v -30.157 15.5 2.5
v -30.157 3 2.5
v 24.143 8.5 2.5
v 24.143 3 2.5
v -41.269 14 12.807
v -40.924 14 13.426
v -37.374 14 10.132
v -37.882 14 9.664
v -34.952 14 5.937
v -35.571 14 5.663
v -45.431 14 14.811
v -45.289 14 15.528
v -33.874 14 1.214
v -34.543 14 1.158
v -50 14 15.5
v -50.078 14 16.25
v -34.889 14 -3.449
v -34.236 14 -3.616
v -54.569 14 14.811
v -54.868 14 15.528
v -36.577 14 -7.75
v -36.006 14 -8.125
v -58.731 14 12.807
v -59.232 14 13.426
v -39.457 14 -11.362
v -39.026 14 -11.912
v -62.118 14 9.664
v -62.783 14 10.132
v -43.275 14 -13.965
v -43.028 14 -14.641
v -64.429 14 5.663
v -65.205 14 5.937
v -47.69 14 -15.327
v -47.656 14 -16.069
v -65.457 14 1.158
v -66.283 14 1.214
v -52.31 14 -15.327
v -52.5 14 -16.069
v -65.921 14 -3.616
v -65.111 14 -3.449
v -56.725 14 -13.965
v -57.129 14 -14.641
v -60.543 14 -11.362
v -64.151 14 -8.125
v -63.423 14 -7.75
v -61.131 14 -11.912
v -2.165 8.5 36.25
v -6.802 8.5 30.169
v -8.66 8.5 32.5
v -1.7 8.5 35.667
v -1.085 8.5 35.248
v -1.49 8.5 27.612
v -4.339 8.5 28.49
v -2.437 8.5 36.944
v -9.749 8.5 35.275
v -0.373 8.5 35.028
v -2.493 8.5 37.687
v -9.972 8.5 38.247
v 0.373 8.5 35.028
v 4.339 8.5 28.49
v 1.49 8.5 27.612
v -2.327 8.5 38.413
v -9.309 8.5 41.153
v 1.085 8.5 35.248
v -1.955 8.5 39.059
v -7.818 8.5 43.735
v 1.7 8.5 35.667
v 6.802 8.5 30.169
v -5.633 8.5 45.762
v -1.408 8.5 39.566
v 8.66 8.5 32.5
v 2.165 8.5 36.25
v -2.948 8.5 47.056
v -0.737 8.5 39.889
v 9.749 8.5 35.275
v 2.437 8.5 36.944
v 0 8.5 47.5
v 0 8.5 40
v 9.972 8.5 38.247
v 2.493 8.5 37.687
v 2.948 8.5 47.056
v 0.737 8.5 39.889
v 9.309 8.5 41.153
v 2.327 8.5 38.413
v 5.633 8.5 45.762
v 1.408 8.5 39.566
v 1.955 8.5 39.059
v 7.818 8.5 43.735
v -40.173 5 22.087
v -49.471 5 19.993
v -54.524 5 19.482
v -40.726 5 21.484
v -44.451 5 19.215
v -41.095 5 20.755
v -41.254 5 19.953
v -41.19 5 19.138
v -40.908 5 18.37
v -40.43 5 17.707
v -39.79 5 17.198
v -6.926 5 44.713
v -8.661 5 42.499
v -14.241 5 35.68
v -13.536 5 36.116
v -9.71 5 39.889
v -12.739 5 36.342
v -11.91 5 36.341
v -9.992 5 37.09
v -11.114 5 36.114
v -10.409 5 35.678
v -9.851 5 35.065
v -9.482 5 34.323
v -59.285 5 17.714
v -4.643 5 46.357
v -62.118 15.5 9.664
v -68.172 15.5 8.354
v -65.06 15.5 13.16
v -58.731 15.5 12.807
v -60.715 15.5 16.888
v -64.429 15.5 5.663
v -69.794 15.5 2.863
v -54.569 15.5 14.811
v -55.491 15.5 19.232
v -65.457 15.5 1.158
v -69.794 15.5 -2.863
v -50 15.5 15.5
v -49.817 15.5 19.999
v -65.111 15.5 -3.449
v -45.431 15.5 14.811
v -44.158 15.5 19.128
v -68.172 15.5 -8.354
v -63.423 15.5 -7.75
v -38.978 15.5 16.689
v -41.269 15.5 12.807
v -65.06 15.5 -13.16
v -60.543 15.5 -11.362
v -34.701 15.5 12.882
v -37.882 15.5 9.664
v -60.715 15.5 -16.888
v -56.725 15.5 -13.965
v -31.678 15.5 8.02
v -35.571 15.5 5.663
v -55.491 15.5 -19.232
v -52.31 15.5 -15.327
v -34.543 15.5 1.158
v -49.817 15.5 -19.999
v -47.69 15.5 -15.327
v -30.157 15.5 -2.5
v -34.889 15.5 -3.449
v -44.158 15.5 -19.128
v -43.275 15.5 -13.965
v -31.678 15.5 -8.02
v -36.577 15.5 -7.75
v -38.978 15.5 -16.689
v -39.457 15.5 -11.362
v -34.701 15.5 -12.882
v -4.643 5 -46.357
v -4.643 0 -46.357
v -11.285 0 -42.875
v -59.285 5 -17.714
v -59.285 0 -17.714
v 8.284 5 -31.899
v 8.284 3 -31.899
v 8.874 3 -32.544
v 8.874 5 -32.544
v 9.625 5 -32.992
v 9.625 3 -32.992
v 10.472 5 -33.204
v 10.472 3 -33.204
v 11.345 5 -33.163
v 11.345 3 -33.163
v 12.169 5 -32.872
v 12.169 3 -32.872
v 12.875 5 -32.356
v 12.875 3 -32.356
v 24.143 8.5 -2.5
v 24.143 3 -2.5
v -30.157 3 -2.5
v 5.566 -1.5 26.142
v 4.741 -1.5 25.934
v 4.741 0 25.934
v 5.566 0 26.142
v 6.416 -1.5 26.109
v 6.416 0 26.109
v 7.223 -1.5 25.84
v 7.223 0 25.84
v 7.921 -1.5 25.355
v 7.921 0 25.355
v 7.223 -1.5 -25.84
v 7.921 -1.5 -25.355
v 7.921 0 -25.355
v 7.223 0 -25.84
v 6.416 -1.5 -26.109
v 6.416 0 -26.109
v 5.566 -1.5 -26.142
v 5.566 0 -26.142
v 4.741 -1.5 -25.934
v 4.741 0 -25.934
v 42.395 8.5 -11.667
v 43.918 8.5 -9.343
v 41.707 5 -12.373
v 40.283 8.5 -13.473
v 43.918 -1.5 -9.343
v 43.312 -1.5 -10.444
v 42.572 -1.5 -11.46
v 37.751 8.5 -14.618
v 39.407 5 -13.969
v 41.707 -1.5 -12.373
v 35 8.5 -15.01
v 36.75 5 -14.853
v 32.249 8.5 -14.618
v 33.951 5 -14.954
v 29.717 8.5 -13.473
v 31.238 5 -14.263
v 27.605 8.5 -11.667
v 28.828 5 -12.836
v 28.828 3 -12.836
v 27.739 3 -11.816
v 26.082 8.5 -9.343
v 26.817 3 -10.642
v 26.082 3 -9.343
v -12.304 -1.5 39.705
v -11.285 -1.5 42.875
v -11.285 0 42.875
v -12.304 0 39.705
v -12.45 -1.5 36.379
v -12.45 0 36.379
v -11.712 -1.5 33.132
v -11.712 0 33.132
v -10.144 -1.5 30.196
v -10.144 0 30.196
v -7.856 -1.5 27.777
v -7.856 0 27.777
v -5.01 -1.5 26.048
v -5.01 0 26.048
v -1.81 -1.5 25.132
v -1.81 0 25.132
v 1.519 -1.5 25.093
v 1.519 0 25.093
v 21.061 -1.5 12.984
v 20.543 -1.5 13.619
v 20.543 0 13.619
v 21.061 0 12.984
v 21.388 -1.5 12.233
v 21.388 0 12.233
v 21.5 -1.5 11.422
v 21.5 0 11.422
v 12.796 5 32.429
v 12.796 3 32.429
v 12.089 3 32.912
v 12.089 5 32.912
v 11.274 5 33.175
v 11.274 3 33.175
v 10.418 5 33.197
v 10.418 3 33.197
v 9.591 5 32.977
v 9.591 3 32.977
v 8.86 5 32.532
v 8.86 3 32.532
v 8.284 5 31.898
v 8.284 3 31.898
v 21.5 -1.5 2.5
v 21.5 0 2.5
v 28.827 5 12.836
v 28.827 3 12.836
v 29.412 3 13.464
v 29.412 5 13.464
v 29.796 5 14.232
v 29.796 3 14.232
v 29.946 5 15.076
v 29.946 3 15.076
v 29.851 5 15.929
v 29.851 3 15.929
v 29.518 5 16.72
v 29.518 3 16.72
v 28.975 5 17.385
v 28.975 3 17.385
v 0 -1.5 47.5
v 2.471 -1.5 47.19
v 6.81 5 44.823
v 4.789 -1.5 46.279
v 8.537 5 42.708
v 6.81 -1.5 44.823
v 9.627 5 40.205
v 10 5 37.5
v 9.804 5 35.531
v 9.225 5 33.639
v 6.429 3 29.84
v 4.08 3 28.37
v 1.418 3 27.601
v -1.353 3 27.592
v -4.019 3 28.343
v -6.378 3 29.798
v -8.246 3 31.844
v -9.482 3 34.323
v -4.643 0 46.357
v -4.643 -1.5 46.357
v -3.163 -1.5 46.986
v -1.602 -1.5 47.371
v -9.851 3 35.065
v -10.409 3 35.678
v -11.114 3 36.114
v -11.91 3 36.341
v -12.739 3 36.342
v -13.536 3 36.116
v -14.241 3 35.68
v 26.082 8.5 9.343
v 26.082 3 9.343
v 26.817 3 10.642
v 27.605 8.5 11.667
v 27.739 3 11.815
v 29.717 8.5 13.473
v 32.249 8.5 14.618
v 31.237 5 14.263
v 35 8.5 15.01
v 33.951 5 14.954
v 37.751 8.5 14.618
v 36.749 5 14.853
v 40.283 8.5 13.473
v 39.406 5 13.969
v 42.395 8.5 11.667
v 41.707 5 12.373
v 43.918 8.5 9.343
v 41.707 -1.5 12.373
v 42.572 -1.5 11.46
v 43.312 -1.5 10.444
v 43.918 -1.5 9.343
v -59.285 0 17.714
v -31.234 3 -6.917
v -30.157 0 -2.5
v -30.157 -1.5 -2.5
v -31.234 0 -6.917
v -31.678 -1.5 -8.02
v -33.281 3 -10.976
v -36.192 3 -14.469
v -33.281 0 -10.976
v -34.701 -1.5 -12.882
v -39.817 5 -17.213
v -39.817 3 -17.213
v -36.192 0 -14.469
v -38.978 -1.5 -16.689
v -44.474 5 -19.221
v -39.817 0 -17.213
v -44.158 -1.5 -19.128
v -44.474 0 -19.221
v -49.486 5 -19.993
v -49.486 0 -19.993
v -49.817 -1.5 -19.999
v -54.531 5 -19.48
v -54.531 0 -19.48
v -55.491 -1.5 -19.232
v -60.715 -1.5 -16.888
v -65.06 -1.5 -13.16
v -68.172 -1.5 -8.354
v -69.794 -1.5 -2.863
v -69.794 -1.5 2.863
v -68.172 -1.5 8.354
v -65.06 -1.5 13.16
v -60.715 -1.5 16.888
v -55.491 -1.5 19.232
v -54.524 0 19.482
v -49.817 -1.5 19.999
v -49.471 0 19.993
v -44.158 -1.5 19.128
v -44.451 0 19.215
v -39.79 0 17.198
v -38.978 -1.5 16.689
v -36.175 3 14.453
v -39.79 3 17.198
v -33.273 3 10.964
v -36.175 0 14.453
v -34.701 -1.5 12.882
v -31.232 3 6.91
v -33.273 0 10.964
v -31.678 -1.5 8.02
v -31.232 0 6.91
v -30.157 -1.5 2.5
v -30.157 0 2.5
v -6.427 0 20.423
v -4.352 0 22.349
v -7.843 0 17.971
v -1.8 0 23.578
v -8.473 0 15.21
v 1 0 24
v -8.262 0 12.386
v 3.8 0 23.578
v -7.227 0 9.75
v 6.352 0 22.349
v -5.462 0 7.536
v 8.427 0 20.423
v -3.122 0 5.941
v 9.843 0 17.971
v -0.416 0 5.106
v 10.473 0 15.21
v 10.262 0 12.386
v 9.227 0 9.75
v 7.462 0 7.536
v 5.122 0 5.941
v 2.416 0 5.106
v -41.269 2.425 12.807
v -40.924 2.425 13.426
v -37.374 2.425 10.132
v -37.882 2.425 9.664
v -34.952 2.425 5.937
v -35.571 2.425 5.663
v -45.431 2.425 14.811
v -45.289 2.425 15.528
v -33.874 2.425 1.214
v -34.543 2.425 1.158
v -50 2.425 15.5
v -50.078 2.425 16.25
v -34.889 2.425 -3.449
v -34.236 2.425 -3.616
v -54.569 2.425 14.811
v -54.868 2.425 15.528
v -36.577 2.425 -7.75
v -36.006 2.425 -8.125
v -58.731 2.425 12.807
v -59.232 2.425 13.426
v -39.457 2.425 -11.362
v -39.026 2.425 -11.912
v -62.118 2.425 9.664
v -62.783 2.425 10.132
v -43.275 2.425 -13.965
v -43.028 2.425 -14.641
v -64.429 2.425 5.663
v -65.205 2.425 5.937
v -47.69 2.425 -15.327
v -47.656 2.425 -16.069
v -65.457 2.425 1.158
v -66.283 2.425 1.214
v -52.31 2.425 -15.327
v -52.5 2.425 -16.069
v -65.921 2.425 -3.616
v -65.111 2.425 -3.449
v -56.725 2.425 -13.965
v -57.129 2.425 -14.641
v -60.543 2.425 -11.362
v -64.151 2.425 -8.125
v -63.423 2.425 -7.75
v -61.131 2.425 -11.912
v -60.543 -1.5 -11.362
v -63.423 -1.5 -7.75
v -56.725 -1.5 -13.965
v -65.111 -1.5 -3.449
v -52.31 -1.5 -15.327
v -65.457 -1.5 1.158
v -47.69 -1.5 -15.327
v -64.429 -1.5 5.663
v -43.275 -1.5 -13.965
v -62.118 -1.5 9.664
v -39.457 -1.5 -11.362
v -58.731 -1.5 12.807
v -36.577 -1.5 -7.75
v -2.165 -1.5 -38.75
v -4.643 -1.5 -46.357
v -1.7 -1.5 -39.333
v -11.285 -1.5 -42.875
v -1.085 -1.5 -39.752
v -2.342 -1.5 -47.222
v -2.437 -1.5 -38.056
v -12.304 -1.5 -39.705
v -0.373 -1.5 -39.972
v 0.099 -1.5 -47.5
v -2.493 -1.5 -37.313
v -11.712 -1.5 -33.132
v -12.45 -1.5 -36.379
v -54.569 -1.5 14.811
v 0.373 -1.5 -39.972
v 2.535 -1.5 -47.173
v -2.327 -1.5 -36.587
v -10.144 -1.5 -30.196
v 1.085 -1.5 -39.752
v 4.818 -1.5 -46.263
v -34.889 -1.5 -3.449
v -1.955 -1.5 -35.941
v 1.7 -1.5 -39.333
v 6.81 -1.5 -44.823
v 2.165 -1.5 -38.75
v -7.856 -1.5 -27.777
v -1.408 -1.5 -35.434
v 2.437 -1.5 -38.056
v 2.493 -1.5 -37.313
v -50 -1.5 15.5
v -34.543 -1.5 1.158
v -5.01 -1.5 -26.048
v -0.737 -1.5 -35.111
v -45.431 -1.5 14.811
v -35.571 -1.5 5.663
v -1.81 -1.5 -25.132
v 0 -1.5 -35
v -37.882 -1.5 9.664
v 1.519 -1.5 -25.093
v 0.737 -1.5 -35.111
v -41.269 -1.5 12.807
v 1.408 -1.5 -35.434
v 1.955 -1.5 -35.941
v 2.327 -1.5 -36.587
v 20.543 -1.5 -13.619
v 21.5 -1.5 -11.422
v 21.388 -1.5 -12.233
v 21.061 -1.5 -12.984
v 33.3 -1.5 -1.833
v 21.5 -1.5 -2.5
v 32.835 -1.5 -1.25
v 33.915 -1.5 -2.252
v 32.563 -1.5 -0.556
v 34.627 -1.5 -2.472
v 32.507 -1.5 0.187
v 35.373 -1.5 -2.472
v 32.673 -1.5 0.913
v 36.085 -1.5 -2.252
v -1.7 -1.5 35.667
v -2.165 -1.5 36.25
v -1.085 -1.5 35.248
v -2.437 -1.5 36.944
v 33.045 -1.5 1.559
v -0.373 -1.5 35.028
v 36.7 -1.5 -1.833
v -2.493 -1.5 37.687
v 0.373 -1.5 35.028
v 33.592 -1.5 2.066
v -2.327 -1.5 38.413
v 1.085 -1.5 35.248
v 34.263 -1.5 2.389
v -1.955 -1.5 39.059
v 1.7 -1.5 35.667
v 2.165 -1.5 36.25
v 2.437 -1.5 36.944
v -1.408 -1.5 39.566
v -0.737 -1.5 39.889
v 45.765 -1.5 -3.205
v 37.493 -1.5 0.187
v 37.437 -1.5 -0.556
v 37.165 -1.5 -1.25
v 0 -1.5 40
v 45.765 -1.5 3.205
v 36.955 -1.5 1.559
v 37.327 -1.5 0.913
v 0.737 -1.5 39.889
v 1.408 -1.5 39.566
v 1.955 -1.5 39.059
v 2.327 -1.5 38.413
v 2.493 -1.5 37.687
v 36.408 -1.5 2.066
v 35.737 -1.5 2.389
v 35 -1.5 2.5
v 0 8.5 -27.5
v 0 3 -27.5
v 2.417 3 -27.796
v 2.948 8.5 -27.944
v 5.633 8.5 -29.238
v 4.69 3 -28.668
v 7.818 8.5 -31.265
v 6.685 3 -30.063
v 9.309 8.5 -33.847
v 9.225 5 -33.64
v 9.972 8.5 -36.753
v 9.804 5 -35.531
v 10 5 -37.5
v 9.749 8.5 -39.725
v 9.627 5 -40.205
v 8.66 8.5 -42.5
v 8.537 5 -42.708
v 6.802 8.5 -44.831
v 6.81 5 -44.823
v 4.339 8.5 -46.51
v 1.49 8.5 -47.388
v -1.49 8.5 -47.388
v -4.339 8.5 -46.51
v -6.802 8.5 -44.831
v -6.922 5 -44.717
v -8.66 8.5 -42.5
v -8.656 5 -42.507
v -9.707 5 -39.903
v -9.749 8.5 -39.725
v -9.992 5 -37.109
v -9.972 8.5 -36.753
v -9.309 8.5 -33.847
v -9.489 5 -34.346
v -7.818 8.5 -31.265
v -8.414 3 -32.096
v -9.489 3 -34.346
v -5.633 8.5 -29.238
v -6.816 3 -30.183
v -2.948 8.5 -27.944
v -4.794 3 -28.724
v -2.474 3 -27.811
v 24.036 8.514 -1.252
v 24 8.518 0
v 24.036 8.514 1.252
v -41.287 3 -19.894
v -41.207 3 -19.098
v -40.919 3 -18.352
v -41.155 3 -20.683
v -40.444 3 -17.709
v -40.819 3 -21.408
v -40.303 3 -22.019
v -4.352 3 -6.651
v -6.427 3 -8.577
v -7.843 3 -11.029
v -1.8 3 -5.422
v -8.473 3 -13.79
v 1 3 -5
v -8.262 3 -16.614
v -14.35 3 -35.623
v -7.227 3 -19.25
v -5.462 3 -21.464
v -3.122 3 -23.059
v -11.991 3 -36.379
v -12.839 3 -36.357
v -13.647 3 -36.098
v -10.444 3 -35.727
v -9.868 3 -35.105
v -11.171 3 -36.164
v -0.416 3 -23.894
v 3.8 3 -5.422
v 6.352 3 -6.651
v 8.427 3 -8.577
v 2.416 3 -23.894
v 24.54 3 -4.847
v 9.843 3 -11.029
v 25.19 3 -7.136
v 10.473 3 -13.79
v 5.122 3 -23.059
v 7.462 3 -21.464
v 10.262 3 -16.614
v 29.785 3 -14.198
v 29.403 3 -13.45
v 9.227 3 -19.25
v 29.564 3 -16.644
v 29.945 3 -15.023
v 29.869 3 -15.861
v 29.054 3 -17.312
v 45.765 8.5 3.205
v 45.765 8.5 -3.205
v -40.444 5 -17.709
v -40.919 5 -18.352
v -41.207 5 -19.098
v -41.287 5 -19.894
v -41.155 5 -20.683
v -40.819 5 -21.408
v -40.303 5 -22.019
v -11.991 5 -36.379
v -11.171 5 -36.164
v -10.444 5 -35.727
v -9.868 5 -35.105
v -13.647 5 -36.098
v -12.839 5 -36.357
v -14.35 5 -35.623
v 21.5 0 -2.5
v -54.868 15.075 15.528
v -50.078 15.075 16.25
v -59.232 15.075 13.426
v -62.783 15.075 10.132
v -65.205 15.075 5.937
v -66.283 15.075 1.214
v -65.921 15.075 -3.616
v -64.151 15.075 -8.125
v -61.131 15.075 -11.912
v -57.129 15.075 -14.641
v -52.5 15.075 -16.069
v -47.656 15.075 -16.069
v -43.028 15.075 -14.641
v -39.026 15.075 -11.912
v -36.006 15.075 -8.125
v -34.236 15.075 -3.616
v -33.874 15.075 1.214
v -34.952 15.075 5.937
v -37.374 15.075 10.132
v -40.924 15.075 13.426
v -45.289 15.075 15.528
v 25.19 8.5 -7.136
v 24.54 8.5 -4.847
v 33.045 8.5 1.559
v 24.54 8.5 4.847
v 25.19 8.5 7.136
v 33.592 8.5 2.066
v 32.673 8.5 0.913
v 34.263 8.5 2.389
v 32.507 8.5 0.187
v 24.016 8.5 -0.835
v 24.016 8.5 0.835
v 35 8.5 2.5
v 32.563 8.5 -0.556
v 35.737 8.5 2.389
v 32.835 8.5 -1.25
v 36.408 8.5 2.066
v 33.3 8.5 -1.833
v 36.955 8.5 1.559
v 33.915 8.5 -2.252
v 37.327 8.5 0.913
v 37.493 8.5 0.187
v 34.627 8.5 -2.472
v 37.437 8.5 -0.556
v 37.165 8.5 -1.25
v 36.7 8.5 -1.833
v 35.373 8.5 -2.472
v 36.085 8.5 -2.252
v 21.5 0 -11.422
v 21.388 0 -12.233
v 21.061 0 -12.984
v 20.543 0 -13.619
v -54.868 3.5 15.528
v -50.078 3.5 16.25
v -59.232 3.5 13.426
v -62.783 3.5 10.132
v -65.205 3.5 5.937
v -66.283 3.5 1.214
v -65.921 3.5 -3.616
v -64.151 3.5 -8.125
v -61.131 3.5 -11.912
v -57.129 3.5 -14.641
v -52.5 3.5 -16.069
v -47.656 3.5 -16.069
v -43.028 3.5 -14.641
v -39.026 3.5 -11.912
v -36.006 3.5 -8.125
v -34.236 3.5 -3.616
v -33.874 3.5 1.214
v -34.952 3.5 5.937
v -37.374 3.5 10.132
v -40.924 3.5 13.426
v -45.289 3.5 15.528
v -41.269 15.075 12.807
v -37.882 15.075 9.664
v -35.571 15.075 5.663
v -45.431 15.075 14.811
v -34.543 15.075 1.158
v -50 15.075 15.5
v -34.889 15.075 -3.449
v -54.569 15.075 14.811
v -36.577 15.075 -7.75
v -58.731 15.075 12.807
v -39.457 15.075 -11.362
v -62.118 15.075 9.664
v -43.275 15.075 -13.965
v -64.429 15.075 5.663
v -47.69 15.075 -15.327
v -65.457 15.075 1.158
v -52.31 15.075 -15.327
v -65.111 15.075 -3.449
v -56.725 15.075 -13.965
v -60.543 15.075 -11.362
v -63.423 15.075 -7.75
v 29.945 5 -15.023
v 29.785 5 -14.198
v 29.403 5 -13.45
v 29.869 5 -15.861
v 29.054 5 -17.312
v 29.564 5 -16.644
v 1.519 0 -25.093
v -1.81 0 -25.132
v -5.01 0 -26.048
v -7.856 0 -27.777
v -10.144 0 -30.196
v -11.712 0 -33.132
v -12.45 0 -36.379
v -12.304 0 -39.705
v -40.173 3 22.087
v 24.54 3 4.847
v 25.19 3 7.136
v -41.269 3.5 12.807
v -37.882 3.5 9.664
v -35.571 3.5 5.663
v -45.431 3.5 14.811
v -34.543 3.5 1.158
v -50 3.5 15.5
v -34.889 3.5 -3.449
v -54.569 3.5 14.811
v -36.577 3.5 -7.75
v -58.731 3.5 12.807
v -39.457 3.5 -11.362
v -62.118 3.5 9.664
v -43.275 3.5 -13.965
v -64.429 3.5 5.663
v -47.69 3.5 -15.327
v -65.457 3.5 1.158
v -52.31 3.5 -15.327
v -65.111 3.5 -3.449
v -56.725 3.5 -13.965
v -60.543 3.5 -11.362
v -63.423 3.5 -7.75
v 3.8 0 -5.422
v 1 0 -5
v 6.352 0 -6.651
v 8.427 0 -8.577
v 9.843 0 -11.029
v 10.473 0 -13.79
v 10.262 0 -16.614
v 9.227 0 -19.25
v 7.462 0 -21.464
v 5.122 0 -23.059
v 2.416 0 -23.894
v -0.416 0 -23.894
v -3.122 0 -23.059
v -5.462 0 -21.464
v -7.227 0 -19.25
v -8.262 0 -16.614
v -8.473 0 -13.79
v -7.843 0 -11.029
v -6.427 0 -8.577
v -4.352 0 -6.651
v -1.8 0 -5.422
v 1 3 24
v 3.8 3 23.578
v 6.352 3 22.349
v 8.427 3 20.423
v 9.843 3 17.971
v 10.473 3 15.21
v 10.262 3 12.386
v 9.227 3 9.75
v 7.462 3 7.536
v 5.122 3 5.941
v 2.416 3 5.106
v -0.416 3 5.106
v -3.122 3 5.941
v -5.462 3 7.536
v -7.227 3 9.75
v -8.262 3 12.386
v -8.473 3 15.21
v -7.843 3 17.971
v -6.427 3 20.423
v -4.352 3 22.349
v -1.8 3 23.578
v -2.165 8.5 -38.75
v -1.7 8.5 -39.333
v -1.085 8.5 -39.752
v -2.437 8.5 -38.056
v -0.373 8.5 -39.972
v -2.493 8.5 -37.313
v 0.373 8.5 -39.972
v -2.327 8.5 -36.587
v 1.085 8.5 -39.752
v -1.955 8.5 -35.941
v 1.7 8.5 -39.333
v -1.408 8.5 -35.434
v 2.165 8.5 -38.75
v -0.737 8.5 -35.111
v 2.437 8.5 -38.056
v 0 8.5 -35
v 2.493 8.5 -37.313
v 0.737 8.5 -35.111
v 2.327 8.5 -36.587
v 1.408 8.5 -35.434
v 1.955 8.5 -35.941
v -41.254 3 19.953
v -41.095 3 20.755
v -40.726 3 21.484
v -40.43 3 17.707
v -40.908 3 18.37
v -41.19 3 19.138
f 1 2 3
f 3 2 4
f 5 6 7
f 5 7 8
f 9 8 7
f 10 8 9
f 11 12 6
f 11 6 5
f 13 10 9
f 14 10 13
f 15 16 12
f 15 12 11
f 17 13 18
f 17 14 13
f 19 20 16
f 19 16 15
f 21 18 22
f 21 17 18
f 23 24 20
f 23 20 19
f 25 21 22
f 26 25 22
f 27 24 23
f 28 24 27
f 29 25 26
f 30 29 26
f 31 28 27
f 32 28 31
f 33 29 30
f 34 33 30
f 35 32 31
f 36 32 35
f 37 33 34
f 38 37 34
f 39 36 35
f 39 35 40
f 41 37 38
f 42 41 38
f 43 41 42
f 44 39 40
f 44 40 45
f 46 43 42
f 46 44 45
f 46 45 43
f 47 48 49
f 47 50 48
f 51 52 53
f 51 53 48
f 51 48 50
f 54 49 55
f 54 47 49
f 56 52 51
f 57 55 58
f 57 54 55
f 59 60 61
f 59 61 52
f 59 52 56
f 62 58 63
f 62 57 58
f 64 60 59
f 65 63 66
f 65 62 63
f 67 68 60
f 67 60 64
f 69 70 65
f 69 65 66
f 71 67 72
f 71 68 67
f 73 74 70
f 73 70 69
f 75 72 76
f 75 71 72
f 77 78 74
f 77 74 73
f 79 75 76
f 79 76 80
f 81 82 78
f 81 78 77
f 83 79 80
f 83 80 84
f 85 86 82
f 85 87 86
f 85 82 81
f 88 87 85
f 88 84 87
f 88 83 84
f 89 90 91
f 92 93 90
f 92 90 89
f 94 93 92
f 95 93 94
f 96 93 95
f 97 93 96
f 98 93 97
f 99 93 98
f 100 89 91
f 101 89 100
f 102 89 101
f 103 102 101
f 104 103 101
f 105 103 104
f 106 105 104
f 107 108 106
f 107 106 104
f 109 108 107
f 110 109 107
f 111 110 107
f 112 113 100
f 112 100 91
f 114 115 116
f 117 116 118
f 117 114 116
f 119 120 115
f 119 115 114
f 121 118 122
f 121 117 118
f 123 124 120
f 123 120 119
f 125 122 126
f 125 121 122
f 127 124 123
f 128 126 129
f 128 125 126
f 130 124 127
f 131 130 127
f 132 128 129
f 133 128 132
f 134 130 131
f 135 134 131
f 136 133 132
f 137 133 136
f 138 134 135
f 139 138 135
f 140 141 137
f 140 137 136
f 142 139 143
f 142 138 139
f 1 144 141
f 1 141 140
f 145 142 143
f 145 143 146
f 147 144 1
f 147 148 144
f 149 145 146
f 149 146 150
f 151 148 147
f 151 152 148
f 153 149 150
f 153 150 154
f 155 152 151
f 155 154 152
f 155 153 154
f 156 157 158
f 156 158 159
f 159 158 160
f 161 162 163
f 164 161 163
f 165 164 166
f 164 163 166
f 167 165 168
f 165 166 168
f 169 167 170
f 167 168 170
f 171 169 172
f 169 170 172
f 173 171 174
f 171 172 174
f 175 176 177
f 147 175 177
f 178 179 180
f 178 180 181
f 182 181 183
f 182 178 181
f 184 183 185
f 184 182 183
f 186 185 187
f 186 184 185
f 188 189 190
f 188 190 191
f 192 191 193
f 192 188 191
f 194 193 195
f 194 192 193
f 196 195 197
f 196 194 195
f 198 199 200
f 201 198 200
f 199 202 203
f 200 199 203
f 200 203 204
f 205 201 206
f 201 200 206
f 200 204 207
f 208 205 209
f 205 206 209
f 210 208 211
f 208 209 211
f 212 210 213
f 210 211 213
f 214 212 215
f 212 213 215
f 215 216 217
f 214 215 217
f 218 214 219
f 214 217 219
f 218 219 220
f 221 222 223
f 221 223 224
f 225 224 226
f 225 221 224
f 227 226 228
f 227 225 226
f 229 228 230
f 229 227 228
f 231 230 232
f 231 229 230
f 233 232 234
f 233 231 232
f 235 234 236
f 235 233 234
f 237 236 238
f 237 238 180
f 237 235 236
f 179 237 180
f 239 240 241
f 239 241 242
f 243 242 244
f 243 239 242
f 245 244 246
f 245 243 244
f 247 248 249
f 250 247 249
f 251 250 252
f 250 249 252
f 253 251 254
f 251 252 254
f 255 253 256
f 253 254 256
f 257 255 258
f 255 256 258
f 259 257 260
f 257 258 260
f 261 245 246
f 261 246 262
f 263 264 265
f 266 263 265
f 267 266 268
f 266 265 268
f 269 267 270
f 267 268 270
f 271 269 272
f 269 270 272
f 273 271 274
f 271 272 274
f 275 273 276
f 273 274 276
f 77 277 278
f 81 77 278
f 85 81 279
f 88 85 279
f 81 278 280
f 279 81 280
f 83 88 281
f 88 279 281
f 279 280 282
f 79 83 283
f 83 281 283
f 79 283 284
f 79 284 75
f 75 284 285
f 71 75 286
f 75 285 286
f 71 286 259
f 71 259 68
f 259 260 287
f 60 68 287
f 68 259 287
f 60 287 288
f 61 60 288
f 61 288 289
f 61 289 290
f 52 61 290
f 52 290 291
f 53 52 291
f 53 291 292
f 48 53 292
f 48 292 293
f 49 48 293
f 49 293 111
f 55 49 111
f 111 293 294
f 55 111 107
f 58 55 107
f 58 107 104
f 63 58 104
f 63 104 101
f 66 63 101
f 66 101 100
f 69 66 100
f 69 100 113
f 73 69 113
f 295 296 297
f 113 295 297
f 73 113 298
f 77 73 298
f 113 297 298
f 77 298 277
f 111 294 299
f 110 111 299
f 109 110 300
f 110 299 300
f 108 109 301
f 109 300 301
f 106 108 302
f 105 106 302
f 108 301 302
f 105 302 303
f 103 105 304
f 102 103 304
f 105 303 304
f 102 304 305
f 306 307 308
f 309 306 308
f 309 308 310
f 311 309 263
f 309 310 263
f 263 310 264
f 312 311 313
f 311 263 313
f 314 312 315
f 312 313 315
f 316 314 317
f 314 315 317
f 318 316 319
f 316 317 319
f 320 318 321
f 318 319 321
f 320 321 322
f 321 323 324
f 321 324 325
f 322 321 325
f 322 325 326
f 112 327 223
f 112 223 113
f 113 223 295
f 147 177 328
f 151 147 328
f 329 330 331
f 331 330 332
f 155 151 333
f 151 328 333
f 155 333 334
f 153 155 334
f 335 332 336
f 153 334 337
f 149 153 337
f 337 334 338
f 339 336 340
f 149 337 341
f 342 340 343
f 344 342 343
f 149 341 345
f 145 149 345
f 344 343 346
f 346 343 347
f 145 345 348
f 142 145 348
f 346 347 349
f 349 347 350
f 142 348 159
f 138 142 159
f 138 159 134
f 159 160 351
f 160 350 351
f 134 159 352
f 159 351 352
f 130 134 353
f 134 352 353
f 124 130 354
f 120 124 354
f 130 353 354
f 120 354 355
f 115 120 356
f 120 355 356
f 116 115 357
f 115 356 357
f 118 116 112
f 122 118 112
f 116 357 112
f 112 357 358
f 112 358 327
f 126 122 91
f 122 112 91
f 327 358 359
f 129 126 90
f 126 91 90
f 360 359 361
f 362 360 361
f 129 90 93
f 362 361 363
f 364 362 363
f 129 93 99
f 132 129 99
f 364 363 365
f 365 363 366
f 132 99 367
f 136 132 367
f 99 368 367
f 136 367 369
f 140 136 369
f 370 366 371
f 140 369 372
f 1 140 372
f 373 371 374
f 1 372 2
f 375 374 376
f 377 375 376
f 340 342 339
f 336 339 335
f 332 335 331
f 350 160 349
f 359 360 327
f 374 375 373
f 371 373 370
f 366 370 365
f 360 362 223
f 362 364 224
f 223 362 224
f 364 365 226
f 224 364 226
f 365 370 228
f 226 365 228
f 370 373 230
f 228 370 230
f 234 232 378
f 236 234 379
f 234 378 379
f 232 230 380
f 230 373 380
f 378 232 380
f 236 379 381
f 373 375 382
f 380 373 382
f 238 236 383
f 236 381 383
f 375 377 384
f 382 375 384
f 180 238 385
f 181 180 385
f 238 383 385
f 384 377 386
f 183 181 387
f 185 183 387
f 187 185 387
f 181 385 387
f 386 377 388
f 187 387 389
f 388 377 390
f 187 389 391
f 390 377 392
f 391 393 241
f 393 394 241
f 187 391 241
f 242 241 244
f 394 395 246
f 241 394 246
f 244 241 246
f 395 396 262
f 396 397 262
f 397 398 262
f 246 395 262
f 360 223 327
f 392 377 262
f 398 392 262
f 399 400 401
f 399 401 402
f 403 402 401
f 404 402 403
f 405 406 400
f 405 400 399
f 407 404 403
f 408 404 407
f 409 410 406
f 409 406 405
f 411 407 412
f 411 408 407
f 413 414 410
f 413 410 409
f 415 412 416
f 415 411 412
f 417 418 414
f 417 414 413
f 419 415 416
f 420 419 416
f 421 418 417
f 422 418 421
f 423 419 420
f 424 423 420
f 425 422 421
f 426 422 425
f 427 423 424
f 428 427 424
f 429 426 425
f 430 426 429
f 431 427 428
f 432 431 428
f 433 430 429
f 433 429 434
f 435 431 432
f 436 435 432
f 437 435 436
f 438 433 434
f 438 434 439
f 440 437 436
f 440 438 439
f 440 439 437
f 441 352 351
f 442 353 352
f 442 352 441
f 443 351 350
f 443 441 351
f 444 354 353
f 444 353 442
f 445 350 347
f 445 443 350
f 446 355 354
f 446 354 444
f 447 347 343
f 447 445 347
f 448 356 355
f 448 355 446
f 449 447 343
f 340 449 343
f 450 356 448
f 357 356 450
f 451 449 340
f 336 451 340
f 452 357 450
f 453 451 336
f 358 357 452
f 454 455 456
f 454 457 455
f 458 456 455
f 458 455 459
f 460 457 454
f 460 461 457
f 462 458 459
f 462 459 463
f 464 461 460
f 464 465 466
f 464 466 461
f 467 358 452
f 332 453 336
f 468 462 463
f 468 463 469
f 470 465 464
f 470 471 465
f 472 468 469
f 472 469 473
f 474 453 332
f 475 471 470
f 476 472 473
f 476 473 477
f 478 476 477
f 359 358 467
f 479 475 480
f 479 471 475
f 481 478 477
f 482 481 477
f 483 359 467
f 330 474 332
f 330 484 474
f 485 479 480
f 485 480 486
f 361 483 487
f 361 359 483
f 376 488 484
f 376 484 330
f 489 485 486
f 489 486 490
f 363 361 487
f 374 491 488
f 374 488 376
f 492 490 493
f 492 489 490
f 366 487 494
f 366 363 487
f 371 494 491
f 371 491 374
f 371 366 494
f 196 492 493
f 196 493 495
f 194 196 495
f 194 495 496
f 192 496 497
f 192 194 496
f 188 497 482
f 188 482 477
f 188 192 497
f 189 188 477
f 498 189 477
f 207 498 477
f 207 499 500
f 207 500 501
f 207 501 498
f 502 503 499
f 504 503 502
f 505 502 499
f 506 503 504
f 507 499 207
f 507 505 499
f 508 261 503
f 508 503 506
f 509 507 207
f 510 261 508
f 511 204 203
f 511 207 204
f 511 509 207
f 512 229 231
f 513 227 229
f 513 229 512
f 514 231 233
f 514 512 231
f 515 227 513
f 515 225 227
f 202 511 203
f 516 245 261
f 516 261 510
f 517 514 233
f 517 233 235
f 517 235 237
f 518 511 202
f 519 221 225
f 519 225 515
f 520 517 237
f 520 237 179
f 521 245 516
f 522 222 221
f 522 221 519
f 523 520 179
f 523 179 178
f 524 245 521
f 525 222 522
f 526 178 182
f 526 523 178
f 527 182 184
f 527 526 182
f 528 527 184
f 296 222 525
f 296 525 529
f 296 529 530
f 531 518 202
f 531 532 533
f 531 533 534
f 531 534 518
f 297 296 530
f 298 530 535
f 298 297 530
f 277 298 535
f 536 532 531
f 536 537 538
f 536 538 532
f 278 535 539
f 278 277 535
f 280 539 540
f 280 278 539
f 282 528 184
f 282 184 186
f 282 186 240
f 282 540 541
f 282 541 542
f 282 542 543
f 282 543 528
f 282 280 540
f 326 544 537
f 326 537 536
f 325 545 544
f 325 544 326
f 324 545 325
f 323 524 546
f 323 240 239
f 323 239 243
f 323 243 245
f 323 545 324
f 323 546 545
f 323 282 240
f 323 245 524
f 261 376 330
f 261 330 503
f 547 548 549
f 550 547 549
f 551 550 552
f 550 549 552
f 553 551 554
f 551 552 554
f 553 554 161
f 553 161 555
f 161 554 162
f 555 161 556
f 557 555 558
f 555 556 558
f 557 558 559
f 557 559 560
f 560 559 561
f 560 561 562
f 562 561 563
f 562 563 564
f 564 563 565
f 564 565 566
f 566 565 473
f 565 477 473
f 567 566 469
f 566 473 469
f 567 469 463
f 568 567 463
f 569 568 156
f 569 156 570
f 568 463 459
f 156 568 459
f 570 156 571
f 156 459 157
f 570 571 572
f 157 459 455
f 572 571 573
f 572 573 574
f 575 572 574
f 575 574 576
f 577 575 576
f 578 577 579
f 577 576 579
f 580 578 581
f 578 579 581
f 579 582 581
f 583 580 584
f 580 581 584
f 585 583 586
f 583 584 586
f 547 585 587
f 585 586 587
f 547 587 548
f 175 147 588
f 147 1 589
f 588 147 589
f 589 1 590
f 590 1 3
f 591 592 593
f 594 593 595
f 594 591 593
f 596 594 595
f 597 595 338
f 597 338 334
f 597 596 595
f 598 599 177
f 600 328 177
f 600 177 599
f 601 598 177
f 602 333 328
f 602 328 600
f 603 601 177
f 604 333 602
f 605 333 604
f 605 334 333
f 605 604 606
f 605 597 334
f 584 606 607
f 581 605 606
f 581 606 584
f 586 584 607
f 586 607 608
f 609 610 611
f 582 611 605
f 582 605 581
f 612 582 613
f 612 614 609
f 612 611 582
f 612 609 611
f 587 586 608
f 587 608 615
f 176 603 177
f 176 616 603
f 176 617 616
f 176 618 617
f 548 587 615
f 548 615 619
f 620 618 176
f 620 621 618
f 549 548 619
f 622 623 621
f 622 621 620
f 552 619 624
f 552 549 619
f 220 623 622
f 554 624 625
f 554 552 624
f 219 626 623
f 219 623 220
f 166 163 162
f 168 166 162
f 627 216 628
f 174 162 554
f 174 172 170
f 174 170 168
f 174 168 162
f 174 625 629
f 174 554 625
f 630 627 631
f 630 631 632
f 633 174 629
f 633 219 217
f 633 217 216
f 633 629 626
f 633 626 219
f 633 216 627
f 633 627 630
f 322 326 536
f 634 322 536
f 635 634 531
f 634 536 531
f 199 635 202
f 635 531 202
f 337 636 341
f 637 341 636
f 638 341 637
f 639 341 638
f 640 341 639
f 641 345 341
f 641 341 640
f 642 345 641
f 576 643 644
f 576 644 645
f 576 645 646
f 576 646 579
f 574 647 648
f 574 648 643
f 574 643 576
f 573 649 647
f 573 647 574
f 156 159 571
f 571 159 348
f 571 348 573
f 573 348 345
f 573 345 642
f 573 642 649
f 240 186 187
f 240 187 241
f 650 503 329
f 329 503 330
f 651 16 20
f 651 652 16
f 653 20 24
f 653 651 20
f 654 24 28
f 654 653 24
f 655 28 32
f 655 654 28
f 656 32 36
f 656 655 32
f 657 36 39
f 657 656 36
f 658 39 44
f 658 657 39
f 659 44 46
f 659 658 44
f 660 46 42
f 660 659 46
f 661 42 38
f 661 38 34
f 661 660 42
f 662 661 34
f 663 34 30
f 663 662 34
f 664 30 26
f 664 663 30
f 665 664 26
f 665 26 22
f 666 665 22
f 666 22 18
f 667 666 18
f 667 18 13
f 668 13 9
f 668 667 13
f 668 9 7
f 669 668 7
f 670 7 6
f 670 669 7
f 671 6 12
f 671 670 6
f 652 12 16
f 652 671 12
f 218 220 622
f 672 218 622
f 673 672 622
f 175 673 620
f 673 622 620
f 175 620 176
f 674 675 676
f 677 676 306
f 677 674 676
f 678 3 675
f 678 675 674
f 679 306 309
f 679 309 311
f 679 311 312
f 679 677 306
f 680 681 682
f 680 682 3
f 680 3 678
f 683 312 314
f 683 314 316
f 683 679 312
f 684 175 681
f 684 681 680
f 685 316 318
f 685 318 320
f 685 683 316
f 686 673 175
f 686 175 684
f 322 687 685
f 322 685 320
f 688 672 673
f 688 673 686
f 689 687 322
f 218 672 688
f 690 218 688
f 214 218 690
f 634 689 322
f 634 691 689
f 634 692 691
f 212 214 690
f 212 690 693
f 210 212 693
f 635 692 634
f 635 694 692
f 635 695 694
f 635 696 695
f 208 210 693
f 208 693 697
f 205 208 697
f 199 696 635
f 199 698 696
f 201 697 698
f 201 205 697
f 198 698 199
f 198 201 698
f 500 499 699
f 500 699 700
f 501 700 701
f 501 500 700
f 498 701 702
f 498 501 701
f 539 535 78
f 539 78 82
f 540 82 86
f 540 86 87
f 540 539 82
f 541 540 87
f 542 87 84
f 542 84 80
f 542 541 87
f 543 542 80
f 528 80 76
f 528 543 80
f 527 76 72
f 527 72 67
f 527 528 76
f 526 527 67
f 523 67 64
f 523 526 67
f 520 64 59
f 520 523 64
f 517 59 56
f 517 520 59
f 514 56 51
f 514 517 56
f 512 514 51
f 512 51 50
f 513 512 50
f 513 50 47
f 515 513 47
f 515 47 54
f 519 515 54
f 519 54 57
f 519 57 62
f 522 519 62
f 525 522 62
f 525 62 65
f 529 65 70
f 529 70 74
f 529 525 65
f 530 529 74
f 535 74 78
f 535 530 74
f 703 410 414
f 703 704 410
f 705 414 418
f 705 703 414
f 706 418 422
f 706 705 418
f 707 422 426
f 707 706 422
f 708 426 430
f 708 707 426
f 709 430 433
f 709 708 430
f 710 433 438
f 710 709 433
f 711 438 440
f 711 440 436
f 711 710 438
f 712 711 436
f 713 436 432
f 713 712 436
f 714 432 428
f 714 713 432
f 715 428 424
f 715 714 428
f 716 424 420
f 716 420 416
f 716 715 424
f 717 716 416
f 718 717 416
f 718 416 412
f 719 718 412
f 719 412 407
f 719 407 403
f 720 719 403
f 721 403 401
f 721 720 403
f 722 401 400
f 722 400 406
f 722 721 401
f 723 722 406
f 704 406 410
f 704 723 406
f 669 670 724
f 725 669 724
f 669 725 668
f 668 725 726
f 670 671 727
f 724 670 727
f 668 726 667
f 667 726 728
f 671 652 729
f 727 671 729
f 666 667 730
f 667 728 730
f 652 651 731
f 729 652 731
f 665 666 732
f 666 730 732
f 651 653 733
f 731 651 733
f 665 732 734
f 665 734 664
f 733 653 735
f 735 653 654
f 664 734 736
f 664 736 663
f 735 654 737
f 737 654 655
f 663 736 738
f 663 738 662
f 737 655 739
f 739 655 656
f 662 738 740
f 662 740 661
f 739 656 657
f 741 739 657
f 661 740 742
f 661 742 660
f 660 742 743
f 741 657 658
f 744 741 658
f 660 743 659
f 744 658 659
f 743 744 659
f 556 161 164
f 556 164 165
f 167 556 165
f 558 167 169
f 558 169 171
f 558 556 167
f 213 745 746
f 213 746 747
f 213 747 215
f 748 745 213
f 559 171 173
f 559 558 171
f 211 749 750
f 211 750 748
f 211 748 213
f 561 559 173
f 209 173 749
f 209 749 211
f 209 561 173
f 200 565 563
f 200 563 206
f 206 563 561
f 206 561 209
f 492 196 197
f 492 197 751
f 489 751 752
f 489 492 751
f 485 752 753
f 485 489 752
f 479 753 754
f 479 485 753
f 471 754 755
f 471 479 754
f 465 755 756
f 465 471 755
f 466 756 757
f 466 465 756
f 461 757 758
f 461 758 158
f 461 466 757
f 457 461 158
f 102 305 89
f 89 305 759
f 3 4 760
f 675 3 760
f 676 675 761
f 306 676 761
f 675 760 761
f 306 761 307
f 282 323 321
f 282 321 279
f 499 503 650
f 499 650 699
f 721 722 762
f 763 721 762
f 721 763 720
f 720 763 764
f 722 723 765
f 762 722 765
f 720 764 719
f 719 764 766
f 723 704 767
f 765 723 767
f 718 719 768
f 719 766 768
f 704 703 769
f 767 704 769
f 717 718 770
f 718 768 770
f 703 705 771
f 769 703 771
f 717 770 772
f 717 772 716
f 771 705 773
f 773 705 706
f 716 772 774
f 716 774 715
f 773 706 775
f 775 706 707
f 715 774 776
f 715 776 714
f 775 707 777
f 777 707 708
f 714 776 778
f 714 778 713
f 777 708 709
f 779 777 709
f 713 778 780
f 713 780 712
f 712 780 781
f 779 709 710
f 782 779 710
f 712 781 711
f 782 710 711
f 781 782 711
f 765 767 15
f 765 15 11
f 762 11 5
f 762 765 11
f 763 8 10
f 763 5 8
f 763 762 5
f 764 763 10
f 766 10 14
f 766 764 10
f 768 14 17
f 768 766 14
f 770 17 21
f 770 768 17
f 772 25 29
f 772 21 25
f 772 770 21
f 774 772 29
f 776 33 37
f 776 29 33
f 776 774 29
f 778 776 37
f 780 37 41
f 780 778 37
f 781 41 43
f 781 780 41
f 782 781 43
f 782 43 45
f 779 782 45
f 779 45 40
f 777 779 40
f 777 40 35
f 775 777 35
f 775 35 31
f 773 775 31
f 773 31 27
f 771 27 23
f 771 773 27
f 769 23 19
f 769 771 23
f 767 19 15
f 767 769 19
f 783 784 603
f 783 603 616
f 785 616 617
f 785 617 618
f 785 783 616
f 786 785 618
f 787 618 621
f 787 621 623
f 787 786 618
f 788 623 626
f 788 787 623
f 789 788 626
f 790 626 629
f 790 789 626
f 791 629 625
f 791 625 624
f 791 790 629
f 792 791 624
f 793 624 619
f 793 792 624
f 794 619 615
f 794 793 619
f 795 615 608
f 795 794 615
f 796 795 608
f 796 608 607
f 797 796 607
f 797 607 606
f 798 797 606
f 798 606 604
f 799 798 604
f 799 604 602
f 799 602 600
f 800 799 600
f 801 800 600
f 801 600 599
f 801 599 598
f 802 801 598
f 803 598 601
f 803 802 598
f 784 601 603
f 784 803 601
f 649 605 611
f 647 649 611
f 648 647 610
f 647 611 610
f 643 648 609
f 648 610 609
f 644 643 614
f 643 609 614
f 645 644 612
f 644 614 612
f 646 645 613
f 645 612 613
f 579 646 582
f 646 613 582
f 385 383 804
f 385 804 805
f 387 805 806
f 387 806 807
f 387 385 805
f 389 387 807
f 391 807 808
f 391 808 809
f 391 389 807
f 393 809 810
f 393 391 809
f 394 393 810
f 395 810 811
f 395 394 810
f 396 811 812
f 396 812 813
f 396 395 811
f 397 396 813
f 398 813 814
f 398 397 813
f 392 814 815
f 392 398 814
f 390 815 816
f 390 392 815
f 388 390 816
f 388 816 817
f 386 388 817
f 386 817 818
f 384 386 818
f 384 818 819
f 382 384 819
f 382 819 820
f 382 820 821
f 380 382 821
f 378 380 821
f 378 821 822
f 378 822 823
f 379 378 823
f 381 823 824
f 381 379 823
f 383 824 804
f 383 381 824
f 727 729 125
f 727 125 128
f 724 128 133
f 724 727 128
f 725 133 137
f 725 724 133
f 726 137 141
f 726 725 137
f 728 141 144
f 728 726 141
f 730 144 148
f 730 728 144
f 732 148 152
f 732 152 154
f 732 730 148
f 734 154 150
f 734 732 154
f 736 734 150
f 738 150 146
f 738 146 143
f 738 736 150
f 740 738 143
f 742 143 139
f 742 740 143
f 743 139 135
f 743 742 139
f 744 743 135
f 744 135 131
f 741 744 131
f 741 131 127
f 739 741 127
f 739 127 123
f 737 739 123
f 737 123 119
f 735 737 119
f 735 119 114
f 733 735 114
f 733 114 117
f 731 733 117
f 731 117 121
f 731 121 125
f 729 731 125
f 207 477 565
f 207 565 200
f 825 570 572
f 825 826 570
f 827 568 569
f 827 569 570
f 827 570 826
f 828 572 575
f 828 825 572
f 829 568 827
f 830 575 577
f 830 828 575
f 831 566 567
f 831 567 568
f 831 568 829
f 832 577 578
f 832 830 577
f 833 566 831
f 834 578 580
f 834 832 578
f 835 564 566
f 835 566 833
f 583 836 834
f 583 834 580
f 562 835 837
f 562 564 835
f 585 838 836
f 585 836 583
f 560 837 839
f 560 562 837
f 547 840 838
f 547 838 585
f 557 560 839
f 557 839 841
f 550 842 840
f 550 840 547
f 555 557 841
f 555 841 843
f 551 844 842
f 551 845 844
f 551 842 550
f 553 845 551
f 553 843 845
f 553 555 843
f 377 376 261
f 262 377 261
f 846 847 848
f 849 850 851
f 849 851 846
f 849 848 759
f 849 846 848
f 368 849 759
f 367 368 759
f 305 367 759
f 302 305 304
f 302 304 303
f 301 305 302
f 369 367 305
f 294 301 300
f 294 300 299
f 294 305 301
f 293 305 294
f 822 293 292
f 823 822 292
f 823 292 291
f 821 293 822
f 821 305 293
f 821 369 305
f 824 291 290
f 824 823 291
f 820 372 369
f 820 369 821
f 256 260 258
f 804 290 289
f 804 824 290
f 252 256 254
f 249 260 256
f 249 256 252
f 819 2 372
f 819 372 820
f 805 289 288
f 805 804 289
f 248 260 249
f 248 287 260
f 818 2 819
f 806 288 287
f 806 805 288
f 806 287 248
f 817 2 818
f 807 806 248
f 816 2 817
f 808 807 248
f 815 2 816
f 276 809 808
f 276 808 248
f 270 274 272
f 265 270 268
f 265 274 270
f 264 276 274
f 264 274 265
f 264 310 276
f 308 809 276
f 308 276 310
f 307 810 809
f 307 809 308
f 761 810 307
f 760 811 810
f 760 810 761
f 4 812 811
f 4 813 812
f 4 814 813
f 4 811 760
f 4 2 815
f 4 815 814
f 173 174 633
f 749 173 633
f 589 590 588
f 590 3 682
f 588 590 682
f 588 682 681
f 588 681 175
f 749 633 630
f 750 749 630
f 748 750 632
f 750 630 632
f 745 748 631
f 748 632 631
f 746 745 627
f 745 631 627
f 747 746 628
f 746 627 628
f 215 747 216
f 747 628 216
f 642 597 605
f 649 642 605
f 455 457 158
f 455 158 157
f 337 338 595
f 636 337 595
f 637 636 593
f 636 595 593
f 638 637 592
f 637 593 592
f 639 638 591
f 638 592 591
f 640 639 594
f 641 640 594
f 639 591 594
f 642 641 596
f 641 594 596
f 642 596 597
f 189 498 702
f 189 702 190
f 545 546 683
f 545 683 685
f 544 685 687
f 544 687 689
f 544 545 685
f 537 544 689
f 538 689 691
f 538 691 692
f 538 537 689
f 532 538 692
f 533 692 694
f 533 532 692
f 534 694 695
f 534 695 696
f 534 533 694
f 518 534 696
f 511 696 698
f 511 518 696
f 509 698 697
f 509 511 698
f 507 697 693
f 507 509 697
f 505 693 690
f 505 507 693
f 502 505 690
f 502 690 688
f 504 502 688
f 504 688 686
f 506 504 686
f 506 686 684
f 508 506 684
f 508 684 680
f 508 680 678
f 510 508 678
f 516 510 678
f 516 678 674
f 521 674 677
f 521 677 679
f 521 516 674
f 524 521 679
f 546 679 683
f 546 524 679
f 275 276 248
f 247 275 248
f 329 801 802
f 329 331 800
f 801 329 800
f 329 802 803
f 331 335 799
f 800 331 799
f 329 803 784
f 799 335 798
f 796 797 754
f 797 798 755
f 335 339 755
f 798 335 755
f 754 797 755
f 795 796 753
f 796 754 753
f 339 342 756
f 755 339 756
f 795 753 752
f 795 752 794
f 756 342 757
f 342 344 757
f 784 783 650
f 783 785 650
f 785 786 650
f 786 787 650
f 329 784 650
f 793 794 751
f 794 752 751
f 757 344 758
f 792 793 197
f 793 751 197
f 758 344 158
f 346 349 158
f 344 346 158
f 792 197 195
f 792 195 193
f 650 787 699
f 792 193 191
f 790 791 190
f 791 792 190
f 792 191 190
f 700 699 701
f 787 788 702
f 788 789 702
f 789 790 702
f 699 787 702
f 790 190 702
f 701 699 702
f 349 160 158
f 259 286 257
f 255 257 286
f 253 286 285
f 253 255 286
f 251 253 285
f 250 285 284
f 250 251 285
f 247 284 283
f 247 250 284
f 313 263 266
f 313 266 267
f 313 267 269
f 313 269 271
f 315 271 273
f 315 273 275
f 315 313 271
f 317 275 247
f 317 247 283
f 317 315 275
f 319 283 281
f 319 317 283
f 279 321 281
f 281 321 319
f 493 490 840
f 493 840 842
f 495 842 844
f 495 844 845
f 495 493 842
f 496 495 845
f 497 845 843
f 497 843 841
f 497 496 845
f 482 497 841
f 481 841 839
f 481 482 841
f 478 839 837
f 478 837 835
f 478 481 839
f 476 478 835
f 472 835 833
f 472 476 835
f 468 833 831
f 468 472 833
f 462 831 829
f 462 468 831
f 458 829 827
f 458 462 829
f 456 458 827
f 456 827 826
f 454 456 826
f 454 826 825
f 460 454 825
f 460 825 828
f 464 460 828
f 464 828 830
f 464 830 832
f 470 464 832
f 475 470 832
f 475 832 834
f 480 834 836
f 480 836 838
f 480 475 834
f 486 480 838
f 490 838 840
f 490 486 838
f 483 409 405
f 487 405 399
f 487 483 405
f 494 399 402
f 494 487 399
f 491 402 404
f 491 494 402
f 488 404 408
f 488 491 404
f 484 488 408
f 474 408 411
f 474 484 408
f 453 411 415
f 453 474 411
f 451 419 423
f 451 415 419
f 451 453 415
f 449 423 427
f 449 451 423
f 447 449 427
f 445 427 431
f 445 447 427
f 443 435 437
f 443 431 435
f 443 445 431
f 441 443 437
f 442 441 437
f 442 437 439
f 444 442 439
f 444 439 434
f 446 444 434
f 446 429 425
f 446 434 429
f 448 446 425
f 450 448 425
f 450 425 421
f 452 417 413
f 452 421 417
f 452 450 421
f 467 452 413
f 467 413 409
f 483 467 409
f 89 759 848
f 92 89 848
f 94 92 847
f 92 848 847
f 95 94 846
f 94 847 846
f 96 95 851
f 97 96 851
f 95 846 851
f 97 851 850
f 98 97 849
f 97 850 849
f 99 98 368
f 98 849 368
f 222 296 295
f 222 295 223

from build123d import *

# Parameters (mm, degrees)
SKETCH1_R                = 9.5
BOSS_EXTRUDE1_DEPTH      = 3
BOSS_EXTRUDE1_2_DEPTH    = 3
BOSS_EXTRUDE2_DEPTH      = 5
BOSS_EXTRUDE3_DEPTH      = 15.5
BOSS_EXTRUDE3_DEPTH_BACK = 1.5
BOSS_EXTRUDE4_DEPTH      = 8.5
BOSS_EXTRUDE4_DEPTH_BACK = 1.5
SKETCH1_5_R              = 10
SKETCH1_5_R_2            = 2.5
BOSS_EXTRUDE5_DEPTH      = 8.5
BOSS_EXTRUDE5_DEPTH_BACK = 1.5
SKETCH1_6_R              = 2.5
BOSS_EXTRUDE6_DEPTH      = 15.5
BOSS_EXTRUDE6_DEPTH_BACK = 1.5
SKETCH1_7_R              = 15.5
CUT_EXTRUDE1_REACH       = 89.409
SKETCH8_W                = 16.25
SKETCH8_H                = 1.075
BOSS_EXTRUDE7_START      = 1.5
BOSS_EXTRUDE7_DEPTH      = 1.5


with BuildPart() as part:
    # Sketch1 → Boss-Extrude1 (new body)
    with BuildSketch(Plane(origin=(0, 0, 0), x_dir=(1, 0, 0), z_dir=(0, 1, 0))):
        with BuildLine():
            ThreePointArc((8.284210438, 31.898941402), (-1.363739049, 27.593425627), (-9.489477618, 34.345667337))
            ThreePointArc((-9.489477618, 34.345667337), (-11.573635866, 36.300800208), (-14.349825716, 35.623282637))
            Line((-14.349825716, 35.623282637), (-40.302516761, 22.019186222))
            ThreePointArc((-40.302516761, 22.019186222), (-41.273789994, 19.493443338), (-39.816532128, 17.213279237))
            ThreePointArc((-39.816532128, 17.213279237), (-33.281167386, 10.97636716), (-30.156865167, 2.5))
            Line((-30.156865167, 2.5), (24.142507006, 2.5))
            ThreePointArc((24.142507006, 2.5), (24.834057729, 6.000240645), (26.082304527, 9.342665949))
            ThreePointArc((26.082304527, 9.342665949), (27.255658523, 11.24637974), (28.828183508, 12.836364321))
            ThreePointArc((28.828183508, 12.836364321), (29.944640188, 15.02344116), (29.053717415, 17.311680053))
            Line((29.053717415, 17.311680053), (12.87474854, 32.355869082))
            ThreePointArc((12.87474854, 32.355869082), (10.472331387, 33.203871974), (8.284210438, 31.898941402))
        make_face()
        with Locations((1, 14.5)):
            Circle(SKETCH1_R, mode=Mode.SUBTRACT)
    extrude(amount=BOSS_EXTRUDE1_DEPTH)



with BuildPart() as body_2:
    # Sketch1 → Boss-Extrude1 2 (new body)
    with BuildSketch(Plane(origin=(0, 0, 0), x_dir=(1, 0, 0), z_dir=(0, 1, 0))):
        with BuildLine():
            ThreePointArc((-30.156865167, -2.5), (-33.272749334, -10.963534337), (-39.790126097, -17.197629921))
            ThreePointArc((-39.790126097, -17.197629921), (-41.249487369, -19.543048034), (-40.173039204, -22.087056839))
            Line((-40.173039204, -22.087056839), (-14.241082593, -35.680284508))
            ThreePointArc((-14.241082593, -35.680284508), (-11.504148883, -36.255537388), (-9.482068, -34.323463137))
            ThreePointArc((-9.482068, -34.323463137), (-1.352594655, -27.591897876), (8.28370035, -31.898187034))
            ThreePointArc((8.28370035, -31.898187034), (10.418414325, -33.197109967), (12.796233312, -32.428877315))
            Line((12.796233312, -32.428877315), (28.974944097, -17.384928273))
            ThreePointArc((28.974944097, -17.384928273), (29.945946241, -15.076495792), (28.827477371, -12.835796554))
            ThreePointArc((28.827477371, -12.835796554), (27.255378579, -11.246023539), (26.082304527, -9.342665949))
            ThreePointArc((26.082304527, -9.342665949), (24.834057729, -6.000240645), (24.142507006, -2.5))
            Line((24.142507006, -2.5), (-30.156865167, -2.5))
        make_face()
        with Locations((1, -14.5)):
            Circle(SKETCH1_R, mode=Mode.SUBTRACT)
    extrude(amount=BOSS_EXTRUDE1_2_DEPTH)


with BuildPart() as part_1:
    add(part.part)

    add(body_2.part)  # Boss-Extrude2 merges body 2
    # Sketch1<3> → Boss-Extrude2 (add)
    with BuildSketch(Plane(origin=(0, 0, 0), x_dir=(1, 0, 0), z_dir=(0, 1, 0))):
        with BuildLine():
            ThreePointArc((-9.489477618, 34.345667337), (-9.273471314, 41.242022153), (-4.642702086, 46.356936115))
            Line((-4.642702086, 46.356936115), (-59.285404172, 17.713872229))
            ThreePointArc((-59.285404172, 17.713872229), (-49.4859203, 19.99339196), (-39.816532128, 17.213279237))
            ThreePointArc((-39.816532128, 17.213279237), (-41.273789994, 19.493443338), (-40.302516761, 22.019186222))
            Line((-40.302516761, 22.019186222), (-14.349825716, 35.623282637))
            ThreePointArc((-14.349825716, 35.623282637), (-11.573635866, 36.300800208), (-9.489477618, 34.345667337))
        make_face()
        with BuildLine():
            Line((41.707436105, 12.373076129), (6.809579802, 44.823224898))
            ThreePointArc((6.809579802, 44.823224898), (9.935537325, 38.633621661), (8.284210438, 31.898941402))
            ThreePointArc((8.284210438, 31.898941402), (10.472331387, 33.203871974), (12.87474854, 32.355869082))
            Line((12.87474854, 32.355869082), (29.053717415, 17.311680053))
            ThreePointArc((29.053717415, 17.311680053), (29.944640188, 15.02344116), (28.828183508, 12.836364321))
            ThreePointArc((28.828183508, 12.836364321), (35.354091909, 15.003333024), (41.707436105, 12.373076129))
        make_face()
        with BuildLine():
            ThreePointArc((-39.790126097, -17.197629921), (-49.47057805, -19.992991582), (-59.285404172, -17.713872229))
            Line((-59.285404172, -17.713872229), (-4.642702086, -46.356936115))
            ThreePointArc((-4.642702086, -46.356936115), (-9.277844603, -41.231165974), (-9.482068, -34.323463137))
            ThreePointArc((-9.482068, -34.323463137), (-11.504148883, -36.255537388), (-14.241082593, -35.680284508))
            Line((-14.241082593, -35.680284508), (-40.173039204, -22.087056839))
            ThreePointArc((-40.173039204, -22.087056839), (-41.249487369, -19.543048034), (-39.790126097, -17.197629921))
        make_face()
        with BuildLine():
            ThreePointArc((8.28370035, -31.898187034), (9.93558893, -38.633169276), (6.809579802, -44.823224898))
            Line((6.809579802, -44.823224898), (41.707436105, -12.373076129))
            ThreePointArc((41.707436105, -12.373076129), (35.353639159, -15.0033493), (28.827477371, -12.835796554))
            ThreePointArc((28.827477371, -12.835796554), (29.945946241, -15.076495792), (28.974944097, -17.384928273))
            Line((28.974944097, -17.384928273), (12.796233312, -32.428877315))
            ThreePointArc((12.796233312, -32.428877315), (10.418414325, -33.197109967), (8.28370035, -31.898187034))
        make_face()
    extrude(amount=BOSS_EXTRUDE2_DEPTH)

    # Sketch1<4> → Boss-Extrude3 (add, two sides: drawn at the far end of the back side and taken through both)
    with BuildSketch(Plane(origin=(0, 0, 0), x_dir=(1, 0, 0), z_dir=(0, 1, 0)).offset(-BOSS_EXTRUDE3_DEPTH_BACK)):
        with BuildLine():
            Line((24.142507006, 2.5), (-30.156865167, 2.5))
            ThreePointArc((-30.156865167, 2.5), (-30.039254815, 1.252458251), (-30, 0))
            ThreePointArc((-30, 0), (-30.039254815, -1.252458251), (-30.156865167, -2.5))
            Line((-30.156865167, -2.5), (24.142507006, -2.5))
            ThreePointArc((24.142507006, -2.5), (24, 0), (24.142507006, 2.5))
        make_face()
    extrude(amount=BOSS_EXTRUDE3_DEPTH + BOSS_EXTRUDE3_DEPTH_BACK)

    # Sketch1<5> → Boss-Extrude4 (add, two sides: drawn at the far end of the back side and taken through both)
    # profile 1 of 2: a face of its own
    with BuildSketch(Plane(origin=(0, 0, 0), x_dir=(1, 0, 0), z_dir=(0, 1, 0)).offset(-BOSS_EXTRUDE4_DEPTH_BACK)):
        with Locations((0, 37.5)):
            Circle(SKETCH1_5_R)
        with Locations((0, 37.5)):
            Circle(SKETCH1_5_R_2, mode=Mode.SUBTRACT)
    # profile 2 of 2: a face of its own
    with BuildSketch(Plane(origin=(0, 0, 0), x_dir=(1, 0, 0), z_dir=(0, 1, 0)).offset(-BOSS_EXTRUDE4_DEPTH_BACK)):
        with Locations((0, -37.5)):
            Circle(SKETCH1_5_R)
        with Locations((0, -37.5)):
            Circle(SKETCH1_5_R_2, mode=Mode.SUBTRACT)
    extrude(amount=BOSS_EXTRUDE4_DEPTH + BOSS_EXTRUDE4_DEPTH_BACK)

    # Sketch1<6> → Boss-Extrude5 (add, two sides: drawn at the far end of the back side and taken through both)
    with BuildSketch(Plane(origin=(0, 0, 0), x_dir=(1, 0, 0), z_dir=(0, 1, 0)).offset(-BOSS_EXTRUDE5_DEPTH_BACK)):
        with BuildLine():
            ThreePointArc((43.917695473, 9.342665949), (42.958142414, 10.964048777), (41.707436105, 12.373076129))
            ThreePointArc((41.707436105, 12.373076129), (35.354091909, 15.003333024), (28.828183508, 12.836364321))
            ThreePointArc((28.828183508, 12.836364321), (27.255658523, 11.24637974), (26.082304527, 9.342665949))
            ThreePointArc((26.082304527, 9.342665949), (24.834057729, 6.000240645), (24.142507006, 2.5))
            ThreePointArc((24.142507006, 2.5), (24, 0), (24.142507006, -2.5))
            ThreePointArc((24.142507006, -2.5), (24.834057729, -6.000240645), (26.082304527, -9.342665949))
            ThreePointArc((26.082304527, -9.342665949), (27.255378579, -11.246023539), (28.827477371, -12.835796554))
            ThreePointArc((28.827477371, -12.835796554), (35.353639159, -15.0033493), (41.707436105, -12.373076129))
            ThreePointArc((41.707436105, -12.373076129), (42.958142414, -10.964048777), (43.917695473, -9.342665949))
            ThreePointArc((43.917695473, -9.342665949), (46, 0), (43.917695473, 9.342665949))
        make_face()
        with Locations((35, 0)):
            Circle(SKETCH1_6_R, mode=Mode.SUBTRACT)
    extrude(amount=BOSS_EXTRUDE5_DEPTH + BOSS_EXTRUDE5_DEPTH_BACK)

    # Sketch1<7> → Boss-Extrude6 (add, two sides: drawn at the far end of the back side and taken through both)
    with BuildSketch(Plane(origin=(0, 0, 0), x_dir=(1, 0, 0), z_dir=(0, 1, 0)).offset(-BOSS_EXTRUDE6_DEPTH_BACK)):
        with BuildLine():
            ThreePointArc((-39.816532128, 17.213279237), (-49.4859203, 19.99339196), (-59.285404172, 17.713872229))
            ThreePointArc((-59.285404172, 17.713872229), (-70, 0), (-59.285404172, -17.713872229))
            ThreePointArc((-59.285404172, -17.713872229), (-49.47057805, -19.992991582), (-39.790126097, -17.197629921))
            ThreePointArc((-39.790126097, -17.197629921), (-33.272749334, -10.963534337), (-30.156865167, -2.5))
            ThreePointArc((-30.156865167, -2.5), (-30.039254815, -1.252458251), (-30, 0))
            ThreePointArc((-30, 0), (-30.039254815, 1.252458251), (-30.156865167, 2.5))
            ThreePointArc((-30.156865167, 2.5), (-33.281167386, 10.97636716), (-39.816532128, 17.213279237))
        make_face()
        with Locations((-50, 0)):
            Circle(SKETCH1_7_R, mode=Mode.SUBTRACT)
    extrude(amount=BOSS_EXTRUDE6_DEPTH + BOSS_EXTRUDE6_DEPTH_BACK)

    # Sketch3 → Cut-Extrude1 (cut, up to next)
    with BuildSketch(Plane.XY.offset(2.5), mode=Mode.PRIVATE) as cut_extrude1_sk1:
        Polygon((-30.156865167, 15.5), (24.142507006, 8.5), (24.142507006, 15.5), align=None)
    cut_extrude1_tool1 = extrude(cut_extrude1_sk1.sketch, amount=-CUT_EXTRUDE1_REACH, mode=Mode.PRIVATE) & part_1.part
    add(cut_extrude1_tool1.solids().sort_by_distance((6.042716, 13.166667, 2.5))[0], mode=Mode.SUBTRACT)

    # Sketch8 → Cut-Revolve2 (revolve, cut)
    with BuildSketch(Plane.XY):
        with Locations((-41.953432584, 14.5375)):
            Rectangle(SKETCH8_W, SKETCH8_H)
        with Locations((-41.953432584, 2.9625)):
            Rectangle(SKETCH8_W, SKETCH8_H)
    revolve(axis=Axis((-50.078432584, 15.075, 0), (0, -1, 0)), mode=Mode.SUBTRACT)

    # Sketch11 → Boss-Extrude7 (add)
    with BuildSketch(Plane.XZ.offset(BOSS_EXTRUDE7_START)):
        with BuildLine():
            Line((6.809579802, -44.823224898), (41.707436105, -12.373076129))
            ThreePointArc((41.707436105, -12.373076129), (33.124591223, -14.829515627), (26.082304527, -9.342665949))
            ThreePointArc((26.082304527, -9.342665949), (24.834057729, -6.000240645), (24.142507006, -2.5))
            Line((24.142507006, -2.5), (21.5, -2.5))
            Line((21.5, -2.5), (21.5, -11.421704032))
            ThreePointArc((21.5, -11.421704032), (21.250329237, -12.619906472), (20.542873941, -13.618671501))
            Line((20.542873941, -13.618671501), (7.921337912, -25.354943159))
            ThreePointArc((7.921337912, -25.354943159), (6.415668049, -26.109485774), (4.740696751, -25.933851362))
            ThreePointArc((4.740696751, -25.933851362), (-9.080647661, -28.909782421), (-11.285404172, -42.87490955))
            Line((-11.285404172, -42.87490955), (-4.642702086, -46.356936115))
            ThreePointArc((-4.642702086, -46.356936115), (-1.327368556, -27.58848686), (6.809579802, -44.823224898))
        make_face()
        with BuildLine():
            Line((41.707436105, 12.373076129), (6.809579802, 44.823224898))
            ThreePointArc((6.809579802, 44.823224898), (-1.327368556, 27.58848686), (-4.642702086, 46.356936115))
            Line((-4.642702086, 46.356936115), (-11.285404172, 42.87490955))
            ThreePointArc((-11.285404172, 42.87490955), (-9.080647661, 28.909782421), (4.740696751, 25.933851362))
            ThreePointArc((4.740696751, 25.933851362), (6.415668049, 26.109485774), (7.921337912, 25.354943159))
            Line((7.921337912, 25.354943159), (20.542873941, 13.618671501))
            ThreePointArc((20.542873941, 13.618671501), (21.250329237, 12.619906472), (21.5, 11.421704032))
            Line((21.5, 11.421704032), (21.5, 2.5))
            Line((21.5, 2.5), (24.142507006, 2.5))
            ThreePointArc((24.142507006, 2.5), (24.834057729, 6.000240645), (26.082304527, 9.342665949))
            ThreePointArc((26.082304527, 9.342665949), (33.124591223, 14.829515627), (41.707436105, 12.373076129))
        make_face()
    extrude(amount=-BOSS_EXTRUDE7_DEPTH)


solid = part_1.part
